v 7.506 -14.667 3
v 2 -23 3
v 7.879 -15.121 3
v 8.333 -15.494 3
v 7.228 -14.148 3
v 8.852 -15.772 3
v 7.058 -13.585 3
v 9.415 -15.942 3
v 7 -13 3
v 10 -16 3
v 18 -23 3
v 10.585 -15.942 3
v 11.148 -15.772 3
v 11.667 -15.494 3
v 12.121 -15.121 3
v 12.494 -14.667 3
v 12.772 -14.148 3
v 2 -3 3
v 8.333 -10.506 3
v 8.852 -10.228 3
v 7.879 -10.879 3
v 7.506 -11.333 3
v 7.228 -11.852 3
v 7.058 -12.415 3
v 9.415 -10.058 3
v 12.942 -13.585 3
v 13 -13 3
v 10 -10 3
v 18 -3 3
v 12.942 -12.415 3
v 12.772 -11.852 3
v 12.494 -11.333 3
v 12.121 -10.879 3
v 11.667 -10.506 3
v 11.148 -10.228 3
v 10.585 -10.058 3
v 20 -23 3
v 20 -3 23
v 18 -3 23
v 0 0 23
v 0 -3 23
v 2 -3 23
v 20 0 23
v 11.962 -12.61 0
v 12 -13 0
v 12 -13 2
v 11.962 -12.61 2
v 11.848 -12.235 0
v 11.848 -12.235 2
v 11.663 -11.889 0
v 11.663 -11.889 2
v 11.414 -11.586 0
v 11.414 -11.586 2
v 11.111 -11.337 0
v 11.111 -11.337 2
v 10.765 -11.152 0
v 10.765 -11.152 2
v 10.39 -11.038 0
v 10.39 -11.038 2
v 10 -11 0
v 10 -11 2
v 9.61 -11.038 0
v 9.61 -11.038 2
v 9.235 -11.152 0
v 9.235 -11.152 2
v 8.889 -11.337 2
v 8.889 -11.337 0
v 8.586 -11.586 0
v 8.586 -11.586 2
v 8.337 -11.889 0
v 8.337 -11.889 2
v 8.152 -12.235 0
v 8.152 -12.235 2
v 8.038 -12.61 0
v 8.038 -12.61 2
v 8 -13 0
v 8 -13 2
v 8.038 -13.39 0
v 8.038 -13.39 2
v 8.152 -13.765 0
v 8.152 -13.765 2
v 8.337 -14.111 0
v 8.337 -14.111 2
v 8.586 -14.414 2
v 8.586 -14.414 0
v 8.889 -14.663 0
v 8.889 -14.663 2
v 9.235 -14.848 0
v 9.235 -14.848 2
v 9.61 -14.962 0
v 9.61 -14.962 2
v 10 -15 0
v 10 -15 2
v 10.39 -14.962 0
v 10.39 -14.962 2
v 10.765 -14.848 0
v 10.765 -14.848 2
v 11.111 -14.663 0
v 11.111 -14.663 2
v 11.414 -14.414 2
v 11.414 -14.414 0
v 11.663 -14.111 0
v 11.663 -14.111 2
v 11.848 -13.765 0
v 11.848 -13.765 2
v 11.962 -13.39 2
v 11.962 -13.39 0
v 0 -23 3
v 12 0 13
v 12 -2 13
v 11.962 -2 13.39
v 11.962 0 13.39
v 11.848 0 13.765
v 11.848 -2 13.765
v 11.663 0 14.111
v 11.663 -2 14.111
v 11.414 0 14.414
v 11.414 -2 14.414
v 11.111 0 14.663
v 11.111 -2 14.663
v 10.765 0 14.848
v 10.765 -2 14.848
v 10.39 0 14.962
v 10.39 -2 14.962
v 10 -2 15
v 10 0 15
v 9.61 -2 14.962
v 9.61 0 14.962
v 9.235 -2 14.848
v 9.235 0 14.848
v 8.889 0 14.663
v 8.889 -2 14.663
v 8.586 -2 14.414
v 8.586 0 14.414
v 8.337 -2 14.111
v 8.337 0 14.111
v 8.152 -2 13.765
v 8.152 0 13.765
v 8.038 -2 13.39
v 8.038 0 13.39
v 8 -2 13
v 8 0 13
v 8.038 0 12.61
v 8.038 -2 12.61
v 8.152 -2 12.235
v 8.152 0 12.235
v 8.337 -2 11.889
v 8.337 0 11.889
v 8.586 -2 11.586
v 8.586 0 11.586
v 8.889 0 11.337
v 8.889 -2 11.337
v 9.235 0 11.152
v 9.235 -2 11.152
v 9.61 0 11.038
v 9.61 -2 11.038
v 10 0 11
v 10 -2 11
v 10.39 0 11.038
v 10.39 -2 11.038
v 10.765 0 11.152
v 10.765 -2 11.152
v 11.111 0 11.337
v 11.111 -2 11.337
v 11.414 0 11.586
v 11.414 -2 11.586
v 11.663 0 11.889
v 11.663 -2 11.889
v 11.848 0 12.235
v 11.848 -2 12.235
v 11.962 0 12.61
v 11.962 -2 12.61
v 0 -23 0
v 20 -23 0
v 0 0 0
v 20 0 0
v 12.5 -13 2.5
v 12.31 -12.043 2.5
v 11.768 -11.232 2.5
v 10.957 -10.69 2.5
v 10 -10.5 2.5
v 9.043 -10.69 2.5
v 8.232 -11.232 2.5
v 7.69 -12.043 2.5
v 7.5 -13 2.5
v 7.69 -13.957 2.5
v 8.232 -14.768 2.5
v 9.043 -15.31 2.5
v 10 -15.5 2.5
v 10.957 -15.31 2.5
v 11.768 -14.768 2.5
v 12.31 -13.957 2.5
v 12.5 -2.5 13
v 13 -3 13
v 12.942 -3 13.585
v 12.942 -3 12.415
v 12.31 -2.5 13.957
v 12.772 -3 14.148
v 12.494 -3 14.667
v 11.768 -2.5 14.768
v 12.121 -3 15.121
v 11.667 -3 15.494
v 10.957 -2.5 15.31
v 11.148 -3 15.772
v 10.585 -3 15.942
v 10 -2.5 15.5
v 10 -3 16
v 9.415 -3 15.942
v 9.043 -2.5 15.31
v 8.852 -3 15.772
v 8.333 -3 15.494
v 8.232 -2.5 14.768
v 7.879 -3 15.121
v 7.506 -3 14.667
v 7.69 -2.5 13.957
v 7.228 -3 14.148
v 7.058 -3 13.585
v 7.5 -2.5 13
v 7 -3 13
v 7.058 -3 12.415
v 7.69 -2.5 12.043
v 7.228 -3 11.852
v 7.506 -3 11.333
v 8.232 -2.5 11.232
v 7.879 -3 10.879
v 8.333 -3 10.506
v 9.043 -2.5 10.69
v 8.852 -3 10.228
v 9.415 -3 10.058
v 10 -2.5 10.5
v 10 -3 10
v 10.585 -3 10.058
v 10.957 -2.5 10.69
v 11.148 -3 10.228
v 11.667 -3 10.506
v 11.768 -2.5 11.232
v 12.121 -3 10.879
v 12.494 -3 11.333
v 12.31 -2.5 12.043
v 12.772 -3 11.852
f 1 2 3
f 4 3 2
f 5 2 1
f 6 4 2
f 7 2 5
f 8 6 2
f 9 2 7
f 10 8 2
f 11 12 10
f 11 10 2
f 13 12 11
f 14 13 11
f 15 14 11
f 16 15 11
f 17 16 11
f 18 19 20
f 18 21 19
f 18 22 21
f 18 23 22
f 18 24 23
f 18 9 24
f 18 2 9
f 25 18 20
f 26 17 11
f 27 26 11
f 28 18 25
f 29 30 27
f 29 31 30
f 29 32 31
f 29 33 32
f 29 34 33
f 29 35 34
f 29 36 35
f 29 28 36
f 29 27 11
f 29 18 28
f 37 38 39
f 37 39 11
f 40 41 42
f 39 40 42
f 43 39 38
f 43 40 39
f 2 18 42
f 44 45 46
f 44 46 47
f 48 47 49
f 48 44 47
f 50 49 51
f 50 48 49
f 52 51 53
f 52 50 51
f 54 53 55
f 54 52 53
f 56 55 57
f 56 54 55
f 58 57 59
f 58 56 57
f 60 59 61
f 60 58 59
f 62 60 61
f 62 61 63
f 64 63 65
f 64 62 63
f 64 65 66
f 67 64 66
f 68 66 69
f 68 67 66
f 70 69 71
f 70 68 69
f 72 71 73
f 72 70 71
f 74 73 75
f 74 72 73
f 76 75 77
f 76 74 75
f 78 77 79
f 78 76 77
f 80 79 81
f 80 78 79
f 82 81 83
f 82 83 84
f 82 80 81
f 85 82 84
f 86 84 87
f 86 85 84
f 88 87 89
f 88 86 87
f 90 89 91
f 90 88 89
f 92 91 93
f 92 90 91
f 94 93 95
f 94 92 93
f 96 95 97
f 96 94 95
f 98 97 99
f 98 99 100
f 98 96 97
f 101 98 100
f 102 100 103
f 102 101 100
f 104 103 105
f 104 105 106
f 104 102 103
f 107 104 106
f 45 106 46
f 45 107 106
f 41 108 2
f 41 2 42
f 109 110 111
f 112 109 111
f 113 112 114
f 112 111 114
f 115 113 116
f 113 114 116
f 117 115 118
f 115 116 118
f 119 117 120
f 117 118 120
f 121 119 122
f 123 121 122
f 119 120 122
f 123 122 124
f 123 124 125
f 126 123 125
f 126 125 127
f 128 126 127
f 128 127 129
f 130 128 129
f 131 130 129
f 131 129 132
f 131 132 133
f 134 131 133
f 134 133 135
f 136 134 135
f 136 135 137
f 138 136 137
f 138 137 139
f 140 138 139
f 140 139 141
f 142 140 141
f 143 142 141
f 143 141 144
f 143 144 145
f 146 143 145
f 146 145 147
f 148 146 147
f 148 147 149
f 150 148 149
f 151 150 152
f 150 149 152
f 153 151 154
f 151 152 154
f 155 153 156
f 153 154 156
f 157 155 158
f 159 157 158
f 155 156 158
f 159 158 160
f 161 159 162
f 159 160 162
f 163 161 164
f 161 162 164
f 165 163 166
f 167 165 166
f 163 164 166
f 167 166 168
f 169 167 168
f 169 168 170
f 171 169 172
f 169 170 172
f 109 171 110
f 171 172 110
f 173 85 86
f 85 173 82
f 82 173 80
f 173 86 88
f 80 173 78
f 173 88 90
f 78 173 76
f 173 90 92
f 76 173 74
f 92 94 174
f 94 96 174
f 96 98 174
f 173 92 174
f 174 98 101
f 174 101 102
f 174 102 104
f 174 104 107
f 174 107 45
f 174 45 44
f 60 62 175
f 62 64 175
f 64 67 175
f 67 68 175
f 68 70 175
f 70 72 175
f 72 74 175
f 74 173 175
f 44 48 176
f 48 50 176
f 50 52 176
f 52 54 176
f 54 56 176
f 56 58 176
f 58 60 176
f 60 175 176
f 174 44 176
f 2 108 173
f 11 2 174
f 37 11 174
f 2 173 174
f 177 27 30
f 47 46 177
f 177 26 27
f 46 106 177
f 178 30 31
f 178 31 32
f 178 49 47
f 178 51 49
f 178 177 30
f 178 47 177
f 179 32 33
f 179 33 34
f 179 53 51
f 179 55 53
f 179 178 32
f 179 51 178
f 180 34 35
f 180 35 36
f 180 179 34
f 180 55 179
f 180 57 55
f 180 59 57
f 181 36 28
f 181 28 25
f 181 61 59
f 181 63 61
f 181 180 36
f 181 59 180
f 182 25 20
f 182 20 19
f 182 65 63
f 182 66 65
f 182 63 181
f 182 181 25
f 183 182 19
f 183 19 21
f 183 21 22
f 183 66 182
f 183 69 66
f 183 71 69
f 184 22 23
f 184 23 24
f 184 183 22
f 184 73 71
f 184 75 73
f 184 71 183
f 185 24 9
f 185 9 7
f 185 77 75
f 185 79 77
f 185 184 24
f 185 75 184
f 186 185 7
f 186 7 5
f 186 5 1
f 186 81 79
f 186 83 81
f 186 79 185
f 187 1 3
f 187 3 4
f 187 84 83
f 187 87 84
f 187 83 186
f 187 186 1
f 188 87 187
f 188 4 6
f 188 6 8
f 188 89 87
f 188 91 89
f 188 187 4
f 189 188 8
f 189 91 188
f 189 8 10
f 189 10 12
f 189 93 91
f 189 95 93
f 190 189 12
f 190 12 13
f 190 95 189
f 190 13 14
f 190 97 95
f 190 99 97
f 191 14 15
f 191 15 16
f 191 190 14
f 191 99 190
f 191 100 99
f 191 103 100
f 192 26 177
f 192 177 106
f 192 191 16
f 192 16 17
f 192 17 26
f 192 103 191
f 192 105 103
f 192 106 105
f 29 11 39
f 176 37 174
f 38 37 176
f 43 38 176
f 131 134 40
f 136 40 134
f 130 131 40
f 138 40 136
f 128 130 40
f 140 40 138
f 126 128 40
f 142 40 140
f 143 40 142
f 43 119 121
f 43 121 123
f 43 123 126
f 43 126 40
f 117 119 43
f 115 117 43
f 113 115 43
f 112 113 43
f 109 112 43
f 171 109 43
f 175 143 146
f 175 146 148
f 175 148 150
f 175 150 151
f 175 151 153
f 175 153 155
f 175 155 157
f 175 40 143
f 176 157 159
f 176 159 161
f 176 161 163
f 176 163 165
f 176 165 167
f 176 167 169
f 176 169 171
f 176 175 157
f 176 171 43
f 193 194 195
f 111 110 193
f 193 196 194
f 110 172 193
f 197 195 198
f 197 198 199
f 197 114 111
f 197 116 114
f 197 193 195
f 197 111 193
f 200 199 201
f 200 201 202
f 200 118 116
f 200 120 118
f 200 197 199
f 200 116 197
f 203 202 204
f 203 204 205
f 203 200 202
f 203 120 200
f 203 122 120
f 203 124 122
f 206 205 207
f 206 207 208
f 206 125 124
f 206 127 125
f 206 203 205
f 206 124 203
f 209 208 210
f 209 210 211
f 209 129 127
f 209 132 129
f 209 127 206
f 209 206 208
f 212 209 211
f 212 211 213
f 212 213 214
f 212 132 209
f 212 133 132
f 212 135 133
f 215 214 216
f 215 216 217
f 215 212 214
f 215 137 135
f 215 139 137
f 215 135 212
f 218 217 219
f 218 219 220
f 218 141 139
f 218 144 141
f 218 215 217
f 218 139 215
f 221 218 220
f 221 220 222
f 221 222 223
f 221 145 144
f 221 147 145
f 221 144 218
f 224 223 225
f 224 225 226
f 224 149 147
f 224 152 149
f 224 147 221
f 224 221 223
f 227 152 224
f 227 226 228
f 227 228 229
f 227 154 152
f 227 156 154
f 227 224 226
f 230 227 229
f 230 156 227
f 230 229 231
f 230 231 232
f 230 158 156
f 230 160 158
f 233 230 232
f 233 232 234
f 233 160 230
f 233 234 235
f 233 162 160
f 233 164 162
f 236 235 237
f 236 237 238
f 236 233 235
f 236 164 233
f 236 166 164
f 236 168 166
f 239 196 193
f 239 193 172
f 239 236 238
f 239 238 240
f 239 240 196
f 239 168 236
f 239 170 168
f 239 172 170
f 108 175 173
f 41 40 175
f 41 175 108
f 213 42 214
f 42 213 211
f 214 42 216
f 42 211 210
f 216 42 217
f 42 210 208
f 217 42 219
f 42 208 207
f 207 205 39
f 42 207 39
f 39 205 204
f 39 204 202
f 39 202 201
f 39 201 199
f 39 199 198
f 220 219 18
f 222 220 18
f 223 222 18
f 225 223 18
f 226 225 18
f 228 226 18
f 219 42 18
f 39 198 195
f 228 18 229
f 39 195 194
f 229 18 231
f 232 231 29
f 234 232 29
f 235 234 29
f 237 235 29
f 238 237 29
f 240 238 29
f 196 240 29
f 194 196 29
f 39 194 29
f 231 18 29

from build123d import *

# Parameters (mm, degrees)
F0_W     = 20
F0_H     = 23
F0_R     = 2
F1_DEPTH = 3
F2_W     = 20
F2_H     = 3
F3_DEPTH = 20
F4_R     = 2
F5_DEPTH = 3.001
F7_DEPTH = 2
F9_DEPTH = 2
F10_SIZE = 1


with BuildPart() as f1:
    # F0 (on Top) → F1 (new body)
    with BuildSketch(Plane.XY):
        with Locations((10, -11.5)):
            Rectangle(F0_W, F0_H)
        with Locations((10, -13)):
            Circle(F0_R, mode=Mode.SUBTRACT)
    extrude(amount=F1_DEPTH)

    # F2 (on face) → F3 (join)
    with BuildSketch(Plane.XY.offset(3)):
        with Locations((10, -1.5)):
            Rectangle(F2_W, F2_H)
    extrude(amount=F3_DEPTH)

    # F4 (on face) → F5 (cut, through all)
    with BuildSketch(Plane.XZ.offset(3)):
        with Locations((10, 13)):
            Circle(F4_R)
    extrude(amount=-F5_DEPTH, mode=Mode.SUBTRACT)

    # F6 (on face) → F7 (join)
    with BuildSketch(Plane.YZ.offset(20)):
        Polygon((-3, 3), (-3, 23), (-23, 3), align=None)
    extrude(amount=-F7_DEPTH)

    # F8 (on face) → F9 (join)
    with BuildSketch(Plane(origin=(0, 0, 0), x_dir=(0, -1, 0), z_dir=(-1, 0, 0))):
        Polygon((23, 3), (3, 23), (3, 3), align=None)
    extrude(amount=-F9_DEPTH)

    # F10
    f10_edges = [f1.edges().sort_by_distance(p)[0] for p in [
        (8, -13, 3),
        (8, -3, 13),
    ]]
    chamfer(f10_edges, length=F10_SIZE)


solid = f1.part
